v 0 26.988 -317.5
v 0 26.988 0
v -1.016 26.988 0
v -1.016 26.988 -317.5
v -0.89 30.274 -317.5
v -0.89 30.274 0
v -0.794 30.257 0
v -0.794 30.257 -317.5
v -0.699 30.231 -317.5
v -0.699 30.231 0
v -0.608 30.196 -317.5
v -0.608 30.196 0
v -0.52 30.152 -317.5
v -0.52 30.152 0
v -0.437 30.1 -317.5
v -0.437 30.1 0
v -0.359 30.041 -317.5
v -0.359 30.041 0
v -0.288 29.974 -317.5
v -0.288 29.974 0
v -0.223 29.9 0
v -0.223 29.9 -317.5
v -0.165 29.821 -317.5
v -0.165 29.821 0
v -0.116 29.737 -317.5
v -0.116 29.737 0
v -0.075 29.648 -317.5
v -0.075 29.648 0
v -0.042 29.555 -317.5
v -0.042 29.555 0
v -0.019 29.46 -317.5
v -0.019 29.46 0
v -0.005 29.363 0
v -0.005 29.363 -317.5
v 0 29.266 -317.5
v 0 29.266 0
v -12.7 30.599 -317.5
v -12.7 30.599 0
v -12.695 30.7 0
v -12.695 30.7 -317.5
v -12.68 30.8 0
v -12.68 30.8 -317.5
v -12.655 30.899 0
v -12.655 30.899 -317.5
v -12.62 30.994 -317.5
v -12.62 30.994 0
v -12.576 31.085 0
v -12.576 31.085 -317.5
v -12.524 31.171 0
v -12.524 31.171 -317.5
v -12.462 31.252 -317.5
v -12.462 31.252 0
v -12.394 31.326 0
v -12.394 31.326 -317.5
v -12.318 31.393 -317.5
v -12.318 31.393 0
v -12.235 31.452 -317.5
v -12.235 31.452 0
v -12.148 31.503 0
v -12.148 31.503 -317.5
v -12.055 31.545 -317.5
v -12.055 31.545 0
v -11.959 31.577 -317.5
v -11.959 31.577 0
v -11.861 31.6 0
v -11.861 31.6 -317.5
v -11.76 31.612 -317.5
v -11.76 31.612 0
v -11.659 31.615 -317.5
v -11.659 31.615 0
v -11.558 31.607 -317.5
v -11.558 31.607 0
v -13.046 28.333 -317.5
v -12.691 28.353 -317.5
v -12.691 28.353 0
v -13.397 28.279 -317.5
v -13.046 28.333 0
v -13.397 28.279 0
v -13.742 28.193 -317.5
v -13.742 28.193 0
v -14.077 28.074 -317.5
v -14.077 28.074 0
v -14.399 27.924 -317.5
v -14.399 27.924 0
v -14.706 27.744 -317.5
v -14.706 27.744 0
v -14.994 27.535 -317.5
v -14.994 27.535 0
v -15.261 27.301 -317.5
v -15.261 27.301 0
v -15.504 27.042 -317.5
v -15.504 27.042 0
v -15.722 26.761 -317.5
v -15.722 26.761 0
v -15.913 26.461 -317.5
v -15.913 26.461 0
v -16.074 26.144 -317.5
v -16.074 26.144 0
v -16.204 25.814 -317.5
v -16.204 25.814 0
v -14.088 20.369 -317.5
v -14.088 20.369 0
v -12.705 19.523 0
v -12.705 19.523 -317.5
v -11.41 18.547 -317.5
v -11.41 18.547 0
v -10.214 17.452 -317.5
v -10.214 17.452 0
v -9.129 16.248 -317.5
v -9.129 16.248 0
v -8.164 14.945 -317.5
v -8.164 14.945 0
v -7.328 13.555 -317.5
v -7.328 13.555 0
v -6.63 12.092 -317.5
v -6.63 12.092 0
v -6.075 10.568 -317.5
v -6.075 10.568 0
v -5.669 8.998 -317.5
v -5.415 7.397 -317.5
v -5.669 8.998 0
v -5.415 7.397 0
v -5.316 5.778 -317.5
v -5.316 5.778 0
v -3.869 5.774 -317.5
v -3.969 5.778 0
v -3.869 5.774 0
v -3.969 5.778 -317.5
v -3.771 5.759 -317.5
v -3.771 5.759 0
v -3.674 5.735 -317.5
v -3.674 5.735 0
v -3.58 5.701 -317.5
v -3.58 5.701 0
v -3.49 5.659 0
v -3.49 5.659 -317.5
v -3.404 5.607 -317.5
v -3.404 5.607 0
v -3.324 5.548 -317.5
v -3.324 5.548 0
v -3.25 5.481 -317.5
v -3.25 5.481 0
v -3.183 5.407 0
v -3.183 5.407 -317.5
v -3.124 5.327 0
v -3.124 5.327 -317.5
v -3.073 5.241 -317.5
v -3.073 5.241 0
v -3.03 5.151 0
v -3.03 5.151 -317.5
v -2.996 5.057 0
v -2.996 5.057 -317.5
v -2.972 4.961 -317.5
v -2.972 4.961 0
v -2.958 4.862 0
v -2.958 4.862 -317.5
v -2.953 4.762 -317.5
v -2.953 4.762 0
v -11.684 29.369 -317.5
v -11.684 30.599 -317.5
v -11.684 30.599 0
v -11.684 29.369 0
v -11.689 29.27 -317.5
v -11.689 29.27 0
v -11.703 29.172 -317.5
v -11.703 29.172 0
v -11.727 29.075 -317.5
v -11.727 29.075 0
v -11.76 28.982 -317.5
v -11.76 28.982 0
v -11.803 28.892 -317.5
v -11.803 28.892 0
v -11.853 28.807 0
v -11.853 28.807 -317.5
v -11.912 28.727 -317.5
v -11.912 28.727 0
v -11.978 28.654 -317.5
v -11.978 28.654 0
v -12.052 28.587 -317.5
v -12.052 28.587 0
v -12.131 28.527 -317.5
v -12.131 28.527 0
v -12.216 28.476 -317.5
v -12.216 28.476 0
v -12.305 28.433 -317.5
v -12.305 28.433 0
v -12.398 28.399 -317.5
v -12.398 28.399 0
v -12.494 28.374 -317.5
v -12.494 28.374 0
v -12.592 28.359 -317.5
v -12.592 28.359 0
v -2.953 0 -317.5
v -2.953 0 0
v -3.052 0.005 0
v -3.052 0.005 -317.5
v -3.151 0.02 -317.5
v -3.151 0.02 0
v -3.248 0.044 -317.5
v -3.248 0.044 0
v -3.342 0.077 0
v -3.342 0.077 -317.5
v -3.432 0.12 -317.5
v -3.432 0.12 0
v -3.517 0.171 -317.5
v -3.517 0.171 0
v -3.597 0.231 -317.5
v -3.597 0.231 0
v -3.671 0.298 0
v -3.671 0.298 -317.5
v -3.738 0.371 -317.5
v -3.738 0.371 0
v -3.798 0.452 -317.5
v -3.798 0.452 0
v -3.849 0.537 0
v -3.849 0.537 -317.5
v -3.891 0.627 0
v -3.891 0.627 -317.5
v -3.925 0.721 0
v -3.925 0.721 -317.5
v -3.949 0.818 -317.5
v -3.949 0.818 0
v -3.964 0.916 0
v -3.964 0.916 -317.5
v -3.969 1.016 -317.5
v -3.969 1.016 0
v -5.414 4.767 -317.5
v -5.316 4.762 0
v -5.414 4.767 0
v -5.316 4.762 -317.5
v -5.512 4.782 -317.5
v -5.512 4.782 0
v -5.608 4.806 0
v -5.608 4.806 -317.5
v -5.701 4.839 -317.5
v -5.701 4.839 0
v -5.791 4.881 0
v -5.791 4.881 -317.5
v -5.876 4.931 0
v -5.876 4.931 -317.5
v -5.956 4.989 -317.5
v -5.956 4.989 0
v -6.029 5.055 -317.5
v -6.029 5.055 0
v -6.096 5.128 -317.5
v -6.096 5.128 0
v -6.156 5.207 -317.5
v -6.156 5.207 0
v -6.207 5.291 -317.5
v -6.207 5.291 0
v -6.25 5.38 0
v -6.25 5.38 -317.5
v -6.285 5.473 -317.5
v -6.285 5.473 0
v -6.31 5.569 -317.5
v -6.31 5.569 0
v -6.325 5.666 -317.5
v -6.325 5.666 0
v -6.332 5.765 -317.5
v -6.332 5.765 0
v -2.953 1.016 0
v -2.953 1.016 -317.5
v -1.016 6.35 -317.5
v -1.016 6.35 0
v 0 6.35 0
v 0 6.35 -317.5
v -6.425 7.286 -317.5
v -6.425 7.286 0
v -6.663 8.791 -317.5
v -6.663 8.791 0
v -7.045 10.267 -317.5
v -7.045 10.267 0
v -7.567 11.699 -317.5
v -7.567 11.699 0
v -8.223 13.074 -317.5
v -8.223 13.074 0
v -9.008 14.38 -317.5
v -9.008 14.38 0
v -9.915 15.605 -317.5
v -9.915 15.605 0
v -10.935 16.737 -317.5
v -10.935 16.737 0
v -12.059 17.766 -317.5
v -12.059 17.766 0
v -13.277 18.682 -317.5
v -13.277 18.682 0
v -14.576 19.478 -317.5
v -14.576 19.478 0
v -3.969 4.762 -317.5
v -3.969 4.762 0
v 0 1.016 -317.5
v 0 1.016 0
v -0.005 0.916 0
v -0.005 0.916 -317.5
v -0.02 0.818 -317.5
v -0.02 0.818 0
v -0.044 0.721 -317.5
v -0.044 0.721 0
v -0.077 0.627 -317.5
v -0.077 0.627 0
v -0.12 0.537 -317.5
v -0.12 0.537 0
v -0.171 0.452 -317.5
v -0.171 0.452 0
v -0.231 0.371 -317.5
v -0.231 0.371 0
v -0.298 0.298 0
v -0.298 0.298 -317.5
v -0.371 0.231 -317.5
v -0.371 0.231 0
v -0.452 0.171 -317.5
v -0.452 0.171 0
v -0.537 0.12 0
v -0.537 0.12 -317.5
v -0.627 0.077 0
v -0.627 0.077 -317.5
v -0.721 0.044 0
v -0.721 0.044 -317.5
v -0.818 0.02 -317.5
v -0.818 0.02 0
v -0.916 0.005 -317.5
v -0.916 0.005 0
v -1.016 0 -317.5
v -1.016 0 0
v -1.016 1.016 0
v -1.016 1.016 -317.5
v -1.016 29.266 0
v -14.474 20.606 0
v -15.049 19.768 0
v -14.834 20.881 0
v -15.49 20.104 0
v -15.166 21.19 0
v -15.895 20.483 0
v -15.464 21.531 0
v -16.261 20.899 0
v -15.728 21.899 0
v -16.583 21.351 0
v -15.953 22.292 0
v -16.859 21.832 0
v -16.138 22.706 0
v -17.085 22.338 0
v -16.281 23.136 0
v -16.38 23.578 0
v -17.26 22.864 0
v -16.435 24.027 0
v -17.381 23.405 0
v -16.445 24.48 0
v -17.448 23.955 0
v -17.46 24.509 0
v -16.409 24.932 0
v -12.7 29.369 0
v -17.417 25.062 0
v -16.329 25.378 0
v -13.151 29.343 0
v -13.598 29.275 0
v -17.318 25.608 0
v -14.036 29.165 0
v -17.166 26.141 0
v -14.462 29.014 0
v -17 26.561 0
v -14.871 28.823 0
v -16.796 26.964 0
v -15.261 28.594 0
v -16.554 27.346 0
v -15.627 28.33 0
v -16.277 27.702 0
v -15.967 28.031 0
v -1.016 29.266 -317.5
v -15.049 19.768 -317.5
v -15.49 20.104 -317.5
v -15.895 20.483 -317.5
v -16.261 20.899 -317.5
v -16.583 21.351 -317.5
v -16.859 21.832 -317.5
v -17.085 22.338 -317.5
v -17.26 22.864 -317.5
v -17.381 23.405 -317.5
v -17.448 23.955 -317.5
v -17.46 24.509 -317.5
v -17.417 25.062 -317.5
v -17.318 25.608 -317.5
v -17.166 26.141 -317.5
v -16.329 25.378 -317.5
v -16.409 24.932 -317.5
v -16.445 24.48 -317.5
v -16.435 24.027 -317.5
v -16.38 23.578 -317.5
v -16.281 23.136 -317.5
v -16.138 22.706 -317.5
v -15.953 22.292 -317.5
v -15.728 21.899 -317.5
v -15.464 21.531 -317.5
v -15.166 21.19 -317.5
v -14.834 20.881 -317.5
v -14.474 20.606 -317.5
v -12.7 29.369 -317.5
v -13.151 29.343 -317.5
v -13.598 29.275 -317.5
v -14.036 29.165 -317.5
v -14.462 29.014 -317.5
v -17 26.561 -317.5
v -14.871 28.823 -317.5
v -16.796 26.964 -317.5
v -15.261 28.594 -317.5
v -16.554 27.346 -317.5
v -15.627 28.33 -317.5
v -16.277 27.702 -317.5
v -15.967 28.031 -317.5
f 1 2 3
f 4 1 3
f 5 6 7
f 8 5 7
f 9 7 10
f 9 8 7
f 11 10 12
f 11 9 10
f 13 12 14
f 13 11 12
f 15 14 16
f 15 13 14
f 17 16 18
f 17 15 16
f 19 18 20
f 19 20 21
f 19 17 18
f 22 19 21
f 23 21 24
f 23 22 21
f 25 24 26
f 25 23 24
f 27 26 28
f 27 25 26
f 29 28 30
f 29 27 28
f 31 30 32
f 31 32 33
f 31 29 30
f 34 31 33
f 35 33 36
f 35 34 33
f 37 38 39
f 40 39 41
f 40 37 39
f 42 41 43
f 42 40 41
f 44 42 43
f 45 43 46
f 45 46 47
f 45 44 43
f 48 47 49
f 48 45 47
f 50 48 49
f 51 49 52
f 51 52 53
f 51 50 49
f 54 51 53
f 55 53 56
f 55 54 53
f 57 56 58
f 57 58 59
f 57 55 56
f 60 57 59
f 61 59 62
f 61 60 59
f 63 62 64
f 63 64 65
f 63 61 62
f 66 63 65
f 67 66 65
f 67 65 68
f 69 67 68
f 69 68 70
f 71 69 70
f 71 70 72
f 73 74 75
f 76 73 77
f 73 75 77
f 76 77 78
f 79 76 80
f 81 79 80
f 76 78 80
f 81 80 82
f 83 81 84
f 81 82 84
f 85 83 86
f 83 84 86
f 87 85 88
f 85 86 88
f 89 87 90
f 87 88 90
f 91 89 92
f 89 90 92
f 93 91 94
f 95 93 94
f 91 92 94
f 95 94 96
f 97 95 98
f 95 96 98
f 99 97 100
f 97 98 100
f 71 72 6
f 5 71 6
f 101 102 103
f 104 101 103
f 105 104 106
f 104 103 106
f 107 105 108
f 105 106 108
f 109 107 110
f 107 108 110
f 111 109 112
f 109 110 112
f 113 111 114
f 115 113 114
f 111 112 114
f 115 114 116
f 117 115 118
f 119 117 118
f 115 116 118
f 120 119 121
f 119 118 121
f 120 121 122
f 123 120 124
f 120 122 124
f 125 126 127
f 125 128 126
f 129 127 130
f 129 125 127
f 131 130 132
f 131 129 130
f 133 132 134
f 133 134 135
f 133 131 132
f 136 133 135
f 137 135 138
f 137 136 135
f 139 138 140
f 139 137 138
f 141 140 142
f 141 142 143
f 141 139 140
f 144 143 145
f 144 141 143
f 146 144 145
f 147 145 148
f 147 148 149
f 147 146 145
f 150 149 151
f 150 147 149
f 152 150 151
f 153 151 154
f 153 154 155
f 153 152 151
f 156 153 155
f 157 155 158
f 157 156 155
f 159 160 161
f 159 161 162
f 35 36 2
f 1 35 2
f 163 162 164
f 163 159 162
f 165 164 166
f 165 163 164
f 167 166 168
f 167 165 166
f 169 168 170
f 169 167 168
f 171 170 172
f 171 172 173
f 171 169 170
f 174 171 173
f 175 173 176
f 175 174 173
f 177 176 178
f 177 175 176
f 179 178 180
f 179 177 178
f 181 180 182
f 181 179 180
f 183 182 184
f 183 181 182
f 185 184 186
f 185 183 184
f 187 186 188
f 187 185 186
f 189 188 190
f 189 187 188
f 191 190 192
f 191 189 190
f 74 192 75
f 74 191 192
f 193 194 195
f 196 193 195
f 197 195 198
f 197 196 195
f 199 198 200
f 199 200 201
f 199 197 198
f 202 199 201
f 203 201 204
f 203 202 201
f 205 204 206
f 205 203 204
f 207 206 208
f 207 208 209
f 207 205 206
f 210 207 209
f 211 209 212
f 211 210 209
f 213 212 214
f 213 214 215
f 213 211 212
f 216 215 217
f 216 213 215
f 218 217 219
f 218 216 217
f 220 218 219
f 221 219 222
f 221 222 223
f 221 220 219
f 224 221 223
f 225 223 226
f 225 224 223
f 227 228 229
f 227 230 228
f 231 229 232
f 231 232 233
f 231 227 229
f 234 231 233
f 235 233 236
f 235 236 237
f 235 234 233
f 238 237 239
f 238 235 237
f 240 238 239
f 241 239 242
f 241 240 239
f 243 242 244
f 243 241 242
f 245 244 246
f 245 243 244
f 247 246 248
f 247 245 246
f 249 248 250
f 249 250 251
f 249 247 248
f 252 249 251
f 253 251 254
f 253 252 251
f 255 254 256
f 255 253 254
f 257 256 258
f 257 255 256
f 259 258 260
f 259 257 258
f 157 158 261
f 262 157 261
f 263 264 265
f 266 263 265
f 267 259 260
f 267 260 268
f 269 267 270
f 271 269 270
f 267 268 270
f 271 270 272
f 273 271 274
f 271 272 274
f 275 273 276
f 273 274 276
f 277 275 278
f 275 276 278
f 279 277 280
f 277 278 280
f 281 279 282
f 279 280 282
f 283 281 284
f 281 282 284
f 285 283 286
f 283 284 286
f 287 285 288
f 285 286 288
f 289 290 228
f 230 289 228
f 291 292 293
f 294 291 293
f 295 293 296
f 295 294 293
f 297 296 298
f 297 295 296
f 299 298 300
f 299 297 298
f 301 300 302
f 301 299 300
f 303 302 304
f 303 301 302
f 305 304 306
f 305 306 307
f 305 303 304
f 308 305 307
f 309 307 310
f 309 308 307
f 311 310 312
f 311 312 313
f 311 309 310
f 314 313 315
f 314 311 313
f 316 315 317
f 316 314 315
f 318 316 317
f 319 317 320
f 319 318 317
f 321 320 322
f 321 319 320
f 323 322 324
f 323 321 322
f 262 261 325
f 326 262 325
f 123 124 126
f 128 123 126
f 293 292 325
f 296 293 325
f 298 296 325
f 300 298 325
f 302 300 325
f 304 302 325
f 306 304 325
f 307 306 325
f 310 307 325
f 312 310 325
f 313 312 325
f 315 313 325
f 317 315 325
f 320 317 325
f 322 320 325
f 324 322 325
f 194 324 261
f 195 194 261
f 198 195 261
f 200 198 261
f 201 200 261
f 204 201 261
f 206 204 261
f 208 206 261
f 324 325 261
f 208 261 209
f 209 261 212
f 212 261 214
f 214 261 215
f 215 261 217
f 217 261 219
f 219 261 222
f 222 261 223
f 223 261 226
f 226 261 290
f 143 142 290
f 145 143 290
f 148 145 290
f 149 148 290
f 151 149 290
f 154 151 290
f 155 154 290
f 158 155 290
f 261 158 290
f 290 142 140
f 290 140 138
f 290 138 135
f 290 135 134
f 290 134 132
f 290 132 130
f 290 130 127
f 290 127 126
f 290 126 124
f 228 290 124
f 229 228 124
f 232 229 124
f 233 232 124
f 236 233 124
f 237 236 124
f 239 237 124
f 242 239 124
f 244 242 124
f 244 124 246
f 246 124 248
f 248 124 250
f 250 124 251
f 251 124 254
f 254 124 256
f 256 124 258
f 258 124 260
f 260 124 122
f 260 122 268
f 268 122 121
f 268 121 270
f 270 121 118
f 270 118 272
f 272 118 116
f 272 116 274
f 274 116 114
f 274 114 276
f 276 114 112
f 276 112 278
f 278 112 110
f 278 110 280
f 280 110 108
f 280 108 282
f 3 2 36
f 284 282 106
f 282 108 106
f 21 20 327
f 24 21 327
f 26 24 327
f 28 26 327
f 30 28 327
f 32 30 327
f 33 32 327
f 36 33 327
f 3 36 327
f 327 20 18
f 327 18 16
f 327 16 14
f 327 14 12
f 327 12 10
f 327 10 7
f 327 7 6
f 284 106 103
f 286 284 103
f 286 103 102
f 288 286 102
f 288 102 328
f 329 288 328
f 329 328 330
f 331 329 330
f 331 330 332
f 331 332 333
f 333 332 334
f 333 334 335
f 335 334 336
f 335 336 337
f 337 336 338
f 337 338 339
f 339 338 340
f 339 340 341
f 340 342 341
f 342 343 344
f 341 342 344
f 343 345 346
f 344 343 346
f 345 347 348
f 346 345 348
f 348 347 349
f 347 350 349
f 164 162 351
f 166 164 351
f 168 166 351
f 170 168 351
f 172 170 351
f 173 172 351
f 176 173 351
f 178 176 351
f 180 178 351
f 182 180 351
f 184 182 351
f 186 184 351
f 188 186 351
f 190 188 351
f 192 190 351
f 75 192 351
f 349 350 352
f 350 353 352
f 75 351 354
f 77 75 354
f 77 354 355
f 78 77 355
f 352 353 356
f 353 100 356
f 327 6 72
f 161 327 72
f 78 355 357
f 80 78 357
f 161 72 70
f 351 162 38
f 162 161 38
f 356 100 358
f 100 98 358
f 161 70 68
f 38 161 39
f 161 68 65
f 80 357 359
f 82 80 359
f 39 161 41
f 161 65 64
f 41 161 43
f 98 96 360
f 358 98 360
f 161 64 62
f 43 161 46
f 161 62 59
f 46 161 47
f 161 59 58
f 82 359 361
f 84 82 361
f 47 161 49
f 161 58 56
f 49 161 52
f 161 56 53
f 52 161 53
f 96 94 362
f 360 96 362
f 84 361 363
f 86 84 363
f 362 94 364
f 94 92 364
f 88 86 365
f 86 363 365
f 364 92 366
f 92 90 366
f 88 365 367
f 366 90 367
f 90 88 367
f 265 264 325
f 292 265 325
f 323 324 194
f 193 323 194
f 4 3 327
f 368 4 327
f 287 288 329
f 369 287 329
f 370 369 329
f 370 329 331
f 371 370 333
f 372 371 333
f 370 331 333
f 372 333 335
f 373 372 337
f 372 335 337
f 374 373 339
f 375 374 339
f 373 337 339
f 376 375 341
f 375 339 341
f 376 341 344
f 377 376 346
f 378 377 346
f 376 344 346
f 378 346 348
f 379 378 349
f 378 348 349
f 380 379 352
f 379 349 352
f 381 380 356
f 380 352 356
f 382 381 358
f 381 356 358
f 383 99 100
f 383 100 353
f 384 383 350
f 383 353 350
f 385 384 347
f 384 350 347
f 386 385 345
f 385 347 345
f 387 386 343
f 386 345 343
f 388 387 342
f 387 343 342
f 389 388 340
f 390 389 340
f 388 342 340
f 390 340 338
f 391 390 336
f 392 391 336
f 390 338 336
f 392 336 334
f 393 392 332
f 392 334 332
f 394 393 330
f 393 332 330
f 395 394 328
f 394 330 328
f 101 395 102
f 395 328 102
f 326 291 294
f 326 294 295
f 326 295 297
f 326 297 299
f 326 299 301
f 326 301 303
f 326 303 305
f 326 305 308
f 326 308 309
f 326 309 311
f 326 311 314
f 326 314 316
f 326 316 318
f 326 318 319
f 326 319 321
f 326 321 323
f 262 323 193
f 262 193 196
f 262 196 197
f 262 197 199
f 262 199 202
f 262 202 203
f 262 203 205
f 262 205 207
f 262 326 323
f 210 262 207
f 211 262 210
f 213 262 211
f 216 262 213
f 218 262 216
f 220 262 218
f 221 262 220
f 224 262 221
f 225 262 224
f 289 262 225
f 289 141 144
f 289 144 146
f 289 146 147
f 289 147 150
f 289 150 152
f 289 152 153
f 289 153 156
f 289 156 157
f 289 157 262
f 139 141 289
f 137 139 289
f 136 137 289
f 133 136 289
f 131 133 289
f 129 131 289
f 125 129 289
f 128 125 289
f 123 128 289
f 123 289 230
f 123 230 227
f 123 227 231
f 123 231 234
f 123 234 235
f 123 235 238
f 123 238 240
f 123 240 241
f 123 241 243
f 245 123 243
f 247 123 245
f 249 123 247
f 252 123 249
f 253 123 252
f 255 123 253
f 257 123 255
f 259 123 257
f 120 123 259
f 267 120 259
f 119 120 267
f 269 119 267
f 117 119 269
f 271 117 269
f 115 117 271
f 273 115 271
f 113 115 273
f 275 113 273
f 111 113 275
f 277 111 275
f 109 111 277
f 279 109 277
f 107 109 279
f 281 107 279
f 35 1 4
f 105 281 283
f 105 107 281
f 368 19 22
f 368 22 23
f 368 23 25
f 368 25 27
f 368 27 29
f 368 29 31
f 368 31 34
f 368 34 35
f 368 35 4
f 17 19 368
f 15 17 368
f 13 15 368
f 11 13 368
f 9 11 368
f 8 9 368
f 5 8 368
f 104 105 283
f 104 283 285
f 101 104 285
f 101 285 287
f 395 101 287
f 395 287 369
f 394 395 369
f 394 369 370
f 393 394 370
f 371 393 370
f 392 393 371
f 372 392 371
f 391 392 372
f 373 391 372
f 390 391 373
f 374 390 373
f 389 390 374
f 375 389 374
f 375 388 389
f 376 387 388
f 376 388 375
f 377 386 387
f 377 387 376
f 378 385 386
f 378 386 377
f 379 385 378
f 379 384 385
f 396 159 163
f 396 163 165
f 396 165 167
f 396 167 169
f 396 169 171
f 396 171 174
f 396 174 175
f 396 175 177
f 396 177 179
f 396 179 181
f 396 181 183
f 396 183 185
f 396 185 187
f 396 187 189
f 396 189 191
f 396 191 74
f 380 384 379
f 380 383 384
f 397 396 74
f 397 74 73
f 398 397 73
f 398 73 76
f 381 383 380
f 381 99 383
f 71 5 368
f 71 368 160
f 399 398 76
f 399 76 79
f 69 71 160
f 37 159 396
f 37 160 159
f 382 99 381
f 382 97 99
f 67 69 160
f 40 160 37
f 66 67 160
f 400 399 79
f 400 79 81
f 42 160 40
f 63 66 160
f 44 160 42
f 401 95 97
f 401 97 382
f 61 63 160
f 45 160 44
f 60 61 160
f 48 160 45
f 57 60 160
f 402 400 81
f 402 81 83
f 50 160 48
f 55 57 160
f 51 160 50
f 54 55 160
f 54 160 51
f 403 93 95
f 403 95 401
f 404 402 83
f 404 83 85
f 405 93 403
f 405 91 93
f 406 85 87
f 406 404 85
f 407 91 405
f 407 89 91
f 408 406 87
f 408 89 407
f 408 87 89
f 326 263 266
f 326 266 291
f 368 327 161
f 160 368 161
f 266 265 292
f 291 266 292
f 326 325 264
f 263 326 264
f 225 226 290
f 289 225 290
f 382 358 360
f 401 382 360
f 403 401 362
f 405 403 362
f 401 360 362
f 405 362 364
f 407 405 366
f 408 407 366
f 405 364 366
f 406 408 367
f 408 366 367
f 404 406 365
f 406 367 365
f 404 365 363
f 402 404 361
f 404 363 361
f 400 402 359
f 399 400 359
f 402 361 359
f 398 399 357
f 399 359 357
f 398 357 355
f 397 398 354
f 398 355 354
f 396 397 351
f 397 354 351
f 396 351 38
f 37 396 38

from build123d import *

# Parameters (mm, degrees)
EXTRUDE_THIN1_DEPTH = 317.5
FILLET1_R           = 1.016


with BuildPart() as part:
    # Sketch1 → Extrude-Thin1 (new body)
    with BuildSketch(Plane.XY):
        with BuildLine():
            Line((0, 6.35), (0, 0))
            Line((0, 0), (-3.96875, 0))
            Line((-3.96875, 0), (-3.96875, 4.7625))
            Line((-3.96875, 4.7625), (-6.35, 4.7625))
            ThreePointArc((-6.35, 4.7625), (-8.34834139, 13.302516912), (-14.576333586, 19.478063073))
            ThreePointArc((-14.576333586, 19.478063073), (-17.085021571, 22.337680243), (-17.166208015, 26.140880807))
            ThreePointArc((-17.166208015, 26.140880807), (-15.447363075, 28.466364673), (-12.7, 29.36875))
            Line((-12.7, 29.36875), (-12.7, 31.75))
            Line((-12.7, 31.75), (0, 30.1625))
            Line((0, 30.1625), (0, 26.9875))
            Line((0, 26.9875), (-1.016, 26.9875))
            Line((-1.016, 26.9875), (-1.016, 29.265593266))
            Line((-1.016, 29.265593266), (-11.684, 30.599093266))
            Line((-11.684, 30.599093266), (-11.684, 28.224203151))
            ThreePointArc((-11.684, 28.224203151), (-14.420615811, 27.912235037), (-16.204387121, 25.813533029))
            ThreePointArc((-16.204387121, 25.813533029), (-16.138046198, 22.705774854), (-14.08808973, 20.369059109))
            ThreePointArc((-14.08808973, 20.369059109), (-7.729180549, 14.259833631), (-5.315606066, 5.7785))
            Line((-5.315606066, 5.7785), (-2.95275, 5.7785))
            Line((-2.95275, 5.7785), (-2.95275, 1.016))
            Line((-2.95275, 1.016), (-1.016, 1.016))
            Line((-1.016, 1.016), (-1.016, 6.35))
            Line((-1.016, 6.35), (0, 6.35))
        make_face()
    extrude(amount=-EXTRUDE_THIN1_DEPTH)

    # Fillet1
    fillet1_edges = [part.edges().sort_by_distance(p)[0] for p in [
        (-11.684, 28.224203151, -158.75),
        (-2.95275, 5.7785, -158.75),
        (0, 0, -158.75),
        (-3.96875, 0, -158.75),
        (-6.35, 4.7625, -158.75),
        (-12.7, 31.75, -158.75),
        (0, 30.1625, -158.75),
    ]]
    fillet(fillet1_edges, radius=FILLET1_R)


solid = part.part
